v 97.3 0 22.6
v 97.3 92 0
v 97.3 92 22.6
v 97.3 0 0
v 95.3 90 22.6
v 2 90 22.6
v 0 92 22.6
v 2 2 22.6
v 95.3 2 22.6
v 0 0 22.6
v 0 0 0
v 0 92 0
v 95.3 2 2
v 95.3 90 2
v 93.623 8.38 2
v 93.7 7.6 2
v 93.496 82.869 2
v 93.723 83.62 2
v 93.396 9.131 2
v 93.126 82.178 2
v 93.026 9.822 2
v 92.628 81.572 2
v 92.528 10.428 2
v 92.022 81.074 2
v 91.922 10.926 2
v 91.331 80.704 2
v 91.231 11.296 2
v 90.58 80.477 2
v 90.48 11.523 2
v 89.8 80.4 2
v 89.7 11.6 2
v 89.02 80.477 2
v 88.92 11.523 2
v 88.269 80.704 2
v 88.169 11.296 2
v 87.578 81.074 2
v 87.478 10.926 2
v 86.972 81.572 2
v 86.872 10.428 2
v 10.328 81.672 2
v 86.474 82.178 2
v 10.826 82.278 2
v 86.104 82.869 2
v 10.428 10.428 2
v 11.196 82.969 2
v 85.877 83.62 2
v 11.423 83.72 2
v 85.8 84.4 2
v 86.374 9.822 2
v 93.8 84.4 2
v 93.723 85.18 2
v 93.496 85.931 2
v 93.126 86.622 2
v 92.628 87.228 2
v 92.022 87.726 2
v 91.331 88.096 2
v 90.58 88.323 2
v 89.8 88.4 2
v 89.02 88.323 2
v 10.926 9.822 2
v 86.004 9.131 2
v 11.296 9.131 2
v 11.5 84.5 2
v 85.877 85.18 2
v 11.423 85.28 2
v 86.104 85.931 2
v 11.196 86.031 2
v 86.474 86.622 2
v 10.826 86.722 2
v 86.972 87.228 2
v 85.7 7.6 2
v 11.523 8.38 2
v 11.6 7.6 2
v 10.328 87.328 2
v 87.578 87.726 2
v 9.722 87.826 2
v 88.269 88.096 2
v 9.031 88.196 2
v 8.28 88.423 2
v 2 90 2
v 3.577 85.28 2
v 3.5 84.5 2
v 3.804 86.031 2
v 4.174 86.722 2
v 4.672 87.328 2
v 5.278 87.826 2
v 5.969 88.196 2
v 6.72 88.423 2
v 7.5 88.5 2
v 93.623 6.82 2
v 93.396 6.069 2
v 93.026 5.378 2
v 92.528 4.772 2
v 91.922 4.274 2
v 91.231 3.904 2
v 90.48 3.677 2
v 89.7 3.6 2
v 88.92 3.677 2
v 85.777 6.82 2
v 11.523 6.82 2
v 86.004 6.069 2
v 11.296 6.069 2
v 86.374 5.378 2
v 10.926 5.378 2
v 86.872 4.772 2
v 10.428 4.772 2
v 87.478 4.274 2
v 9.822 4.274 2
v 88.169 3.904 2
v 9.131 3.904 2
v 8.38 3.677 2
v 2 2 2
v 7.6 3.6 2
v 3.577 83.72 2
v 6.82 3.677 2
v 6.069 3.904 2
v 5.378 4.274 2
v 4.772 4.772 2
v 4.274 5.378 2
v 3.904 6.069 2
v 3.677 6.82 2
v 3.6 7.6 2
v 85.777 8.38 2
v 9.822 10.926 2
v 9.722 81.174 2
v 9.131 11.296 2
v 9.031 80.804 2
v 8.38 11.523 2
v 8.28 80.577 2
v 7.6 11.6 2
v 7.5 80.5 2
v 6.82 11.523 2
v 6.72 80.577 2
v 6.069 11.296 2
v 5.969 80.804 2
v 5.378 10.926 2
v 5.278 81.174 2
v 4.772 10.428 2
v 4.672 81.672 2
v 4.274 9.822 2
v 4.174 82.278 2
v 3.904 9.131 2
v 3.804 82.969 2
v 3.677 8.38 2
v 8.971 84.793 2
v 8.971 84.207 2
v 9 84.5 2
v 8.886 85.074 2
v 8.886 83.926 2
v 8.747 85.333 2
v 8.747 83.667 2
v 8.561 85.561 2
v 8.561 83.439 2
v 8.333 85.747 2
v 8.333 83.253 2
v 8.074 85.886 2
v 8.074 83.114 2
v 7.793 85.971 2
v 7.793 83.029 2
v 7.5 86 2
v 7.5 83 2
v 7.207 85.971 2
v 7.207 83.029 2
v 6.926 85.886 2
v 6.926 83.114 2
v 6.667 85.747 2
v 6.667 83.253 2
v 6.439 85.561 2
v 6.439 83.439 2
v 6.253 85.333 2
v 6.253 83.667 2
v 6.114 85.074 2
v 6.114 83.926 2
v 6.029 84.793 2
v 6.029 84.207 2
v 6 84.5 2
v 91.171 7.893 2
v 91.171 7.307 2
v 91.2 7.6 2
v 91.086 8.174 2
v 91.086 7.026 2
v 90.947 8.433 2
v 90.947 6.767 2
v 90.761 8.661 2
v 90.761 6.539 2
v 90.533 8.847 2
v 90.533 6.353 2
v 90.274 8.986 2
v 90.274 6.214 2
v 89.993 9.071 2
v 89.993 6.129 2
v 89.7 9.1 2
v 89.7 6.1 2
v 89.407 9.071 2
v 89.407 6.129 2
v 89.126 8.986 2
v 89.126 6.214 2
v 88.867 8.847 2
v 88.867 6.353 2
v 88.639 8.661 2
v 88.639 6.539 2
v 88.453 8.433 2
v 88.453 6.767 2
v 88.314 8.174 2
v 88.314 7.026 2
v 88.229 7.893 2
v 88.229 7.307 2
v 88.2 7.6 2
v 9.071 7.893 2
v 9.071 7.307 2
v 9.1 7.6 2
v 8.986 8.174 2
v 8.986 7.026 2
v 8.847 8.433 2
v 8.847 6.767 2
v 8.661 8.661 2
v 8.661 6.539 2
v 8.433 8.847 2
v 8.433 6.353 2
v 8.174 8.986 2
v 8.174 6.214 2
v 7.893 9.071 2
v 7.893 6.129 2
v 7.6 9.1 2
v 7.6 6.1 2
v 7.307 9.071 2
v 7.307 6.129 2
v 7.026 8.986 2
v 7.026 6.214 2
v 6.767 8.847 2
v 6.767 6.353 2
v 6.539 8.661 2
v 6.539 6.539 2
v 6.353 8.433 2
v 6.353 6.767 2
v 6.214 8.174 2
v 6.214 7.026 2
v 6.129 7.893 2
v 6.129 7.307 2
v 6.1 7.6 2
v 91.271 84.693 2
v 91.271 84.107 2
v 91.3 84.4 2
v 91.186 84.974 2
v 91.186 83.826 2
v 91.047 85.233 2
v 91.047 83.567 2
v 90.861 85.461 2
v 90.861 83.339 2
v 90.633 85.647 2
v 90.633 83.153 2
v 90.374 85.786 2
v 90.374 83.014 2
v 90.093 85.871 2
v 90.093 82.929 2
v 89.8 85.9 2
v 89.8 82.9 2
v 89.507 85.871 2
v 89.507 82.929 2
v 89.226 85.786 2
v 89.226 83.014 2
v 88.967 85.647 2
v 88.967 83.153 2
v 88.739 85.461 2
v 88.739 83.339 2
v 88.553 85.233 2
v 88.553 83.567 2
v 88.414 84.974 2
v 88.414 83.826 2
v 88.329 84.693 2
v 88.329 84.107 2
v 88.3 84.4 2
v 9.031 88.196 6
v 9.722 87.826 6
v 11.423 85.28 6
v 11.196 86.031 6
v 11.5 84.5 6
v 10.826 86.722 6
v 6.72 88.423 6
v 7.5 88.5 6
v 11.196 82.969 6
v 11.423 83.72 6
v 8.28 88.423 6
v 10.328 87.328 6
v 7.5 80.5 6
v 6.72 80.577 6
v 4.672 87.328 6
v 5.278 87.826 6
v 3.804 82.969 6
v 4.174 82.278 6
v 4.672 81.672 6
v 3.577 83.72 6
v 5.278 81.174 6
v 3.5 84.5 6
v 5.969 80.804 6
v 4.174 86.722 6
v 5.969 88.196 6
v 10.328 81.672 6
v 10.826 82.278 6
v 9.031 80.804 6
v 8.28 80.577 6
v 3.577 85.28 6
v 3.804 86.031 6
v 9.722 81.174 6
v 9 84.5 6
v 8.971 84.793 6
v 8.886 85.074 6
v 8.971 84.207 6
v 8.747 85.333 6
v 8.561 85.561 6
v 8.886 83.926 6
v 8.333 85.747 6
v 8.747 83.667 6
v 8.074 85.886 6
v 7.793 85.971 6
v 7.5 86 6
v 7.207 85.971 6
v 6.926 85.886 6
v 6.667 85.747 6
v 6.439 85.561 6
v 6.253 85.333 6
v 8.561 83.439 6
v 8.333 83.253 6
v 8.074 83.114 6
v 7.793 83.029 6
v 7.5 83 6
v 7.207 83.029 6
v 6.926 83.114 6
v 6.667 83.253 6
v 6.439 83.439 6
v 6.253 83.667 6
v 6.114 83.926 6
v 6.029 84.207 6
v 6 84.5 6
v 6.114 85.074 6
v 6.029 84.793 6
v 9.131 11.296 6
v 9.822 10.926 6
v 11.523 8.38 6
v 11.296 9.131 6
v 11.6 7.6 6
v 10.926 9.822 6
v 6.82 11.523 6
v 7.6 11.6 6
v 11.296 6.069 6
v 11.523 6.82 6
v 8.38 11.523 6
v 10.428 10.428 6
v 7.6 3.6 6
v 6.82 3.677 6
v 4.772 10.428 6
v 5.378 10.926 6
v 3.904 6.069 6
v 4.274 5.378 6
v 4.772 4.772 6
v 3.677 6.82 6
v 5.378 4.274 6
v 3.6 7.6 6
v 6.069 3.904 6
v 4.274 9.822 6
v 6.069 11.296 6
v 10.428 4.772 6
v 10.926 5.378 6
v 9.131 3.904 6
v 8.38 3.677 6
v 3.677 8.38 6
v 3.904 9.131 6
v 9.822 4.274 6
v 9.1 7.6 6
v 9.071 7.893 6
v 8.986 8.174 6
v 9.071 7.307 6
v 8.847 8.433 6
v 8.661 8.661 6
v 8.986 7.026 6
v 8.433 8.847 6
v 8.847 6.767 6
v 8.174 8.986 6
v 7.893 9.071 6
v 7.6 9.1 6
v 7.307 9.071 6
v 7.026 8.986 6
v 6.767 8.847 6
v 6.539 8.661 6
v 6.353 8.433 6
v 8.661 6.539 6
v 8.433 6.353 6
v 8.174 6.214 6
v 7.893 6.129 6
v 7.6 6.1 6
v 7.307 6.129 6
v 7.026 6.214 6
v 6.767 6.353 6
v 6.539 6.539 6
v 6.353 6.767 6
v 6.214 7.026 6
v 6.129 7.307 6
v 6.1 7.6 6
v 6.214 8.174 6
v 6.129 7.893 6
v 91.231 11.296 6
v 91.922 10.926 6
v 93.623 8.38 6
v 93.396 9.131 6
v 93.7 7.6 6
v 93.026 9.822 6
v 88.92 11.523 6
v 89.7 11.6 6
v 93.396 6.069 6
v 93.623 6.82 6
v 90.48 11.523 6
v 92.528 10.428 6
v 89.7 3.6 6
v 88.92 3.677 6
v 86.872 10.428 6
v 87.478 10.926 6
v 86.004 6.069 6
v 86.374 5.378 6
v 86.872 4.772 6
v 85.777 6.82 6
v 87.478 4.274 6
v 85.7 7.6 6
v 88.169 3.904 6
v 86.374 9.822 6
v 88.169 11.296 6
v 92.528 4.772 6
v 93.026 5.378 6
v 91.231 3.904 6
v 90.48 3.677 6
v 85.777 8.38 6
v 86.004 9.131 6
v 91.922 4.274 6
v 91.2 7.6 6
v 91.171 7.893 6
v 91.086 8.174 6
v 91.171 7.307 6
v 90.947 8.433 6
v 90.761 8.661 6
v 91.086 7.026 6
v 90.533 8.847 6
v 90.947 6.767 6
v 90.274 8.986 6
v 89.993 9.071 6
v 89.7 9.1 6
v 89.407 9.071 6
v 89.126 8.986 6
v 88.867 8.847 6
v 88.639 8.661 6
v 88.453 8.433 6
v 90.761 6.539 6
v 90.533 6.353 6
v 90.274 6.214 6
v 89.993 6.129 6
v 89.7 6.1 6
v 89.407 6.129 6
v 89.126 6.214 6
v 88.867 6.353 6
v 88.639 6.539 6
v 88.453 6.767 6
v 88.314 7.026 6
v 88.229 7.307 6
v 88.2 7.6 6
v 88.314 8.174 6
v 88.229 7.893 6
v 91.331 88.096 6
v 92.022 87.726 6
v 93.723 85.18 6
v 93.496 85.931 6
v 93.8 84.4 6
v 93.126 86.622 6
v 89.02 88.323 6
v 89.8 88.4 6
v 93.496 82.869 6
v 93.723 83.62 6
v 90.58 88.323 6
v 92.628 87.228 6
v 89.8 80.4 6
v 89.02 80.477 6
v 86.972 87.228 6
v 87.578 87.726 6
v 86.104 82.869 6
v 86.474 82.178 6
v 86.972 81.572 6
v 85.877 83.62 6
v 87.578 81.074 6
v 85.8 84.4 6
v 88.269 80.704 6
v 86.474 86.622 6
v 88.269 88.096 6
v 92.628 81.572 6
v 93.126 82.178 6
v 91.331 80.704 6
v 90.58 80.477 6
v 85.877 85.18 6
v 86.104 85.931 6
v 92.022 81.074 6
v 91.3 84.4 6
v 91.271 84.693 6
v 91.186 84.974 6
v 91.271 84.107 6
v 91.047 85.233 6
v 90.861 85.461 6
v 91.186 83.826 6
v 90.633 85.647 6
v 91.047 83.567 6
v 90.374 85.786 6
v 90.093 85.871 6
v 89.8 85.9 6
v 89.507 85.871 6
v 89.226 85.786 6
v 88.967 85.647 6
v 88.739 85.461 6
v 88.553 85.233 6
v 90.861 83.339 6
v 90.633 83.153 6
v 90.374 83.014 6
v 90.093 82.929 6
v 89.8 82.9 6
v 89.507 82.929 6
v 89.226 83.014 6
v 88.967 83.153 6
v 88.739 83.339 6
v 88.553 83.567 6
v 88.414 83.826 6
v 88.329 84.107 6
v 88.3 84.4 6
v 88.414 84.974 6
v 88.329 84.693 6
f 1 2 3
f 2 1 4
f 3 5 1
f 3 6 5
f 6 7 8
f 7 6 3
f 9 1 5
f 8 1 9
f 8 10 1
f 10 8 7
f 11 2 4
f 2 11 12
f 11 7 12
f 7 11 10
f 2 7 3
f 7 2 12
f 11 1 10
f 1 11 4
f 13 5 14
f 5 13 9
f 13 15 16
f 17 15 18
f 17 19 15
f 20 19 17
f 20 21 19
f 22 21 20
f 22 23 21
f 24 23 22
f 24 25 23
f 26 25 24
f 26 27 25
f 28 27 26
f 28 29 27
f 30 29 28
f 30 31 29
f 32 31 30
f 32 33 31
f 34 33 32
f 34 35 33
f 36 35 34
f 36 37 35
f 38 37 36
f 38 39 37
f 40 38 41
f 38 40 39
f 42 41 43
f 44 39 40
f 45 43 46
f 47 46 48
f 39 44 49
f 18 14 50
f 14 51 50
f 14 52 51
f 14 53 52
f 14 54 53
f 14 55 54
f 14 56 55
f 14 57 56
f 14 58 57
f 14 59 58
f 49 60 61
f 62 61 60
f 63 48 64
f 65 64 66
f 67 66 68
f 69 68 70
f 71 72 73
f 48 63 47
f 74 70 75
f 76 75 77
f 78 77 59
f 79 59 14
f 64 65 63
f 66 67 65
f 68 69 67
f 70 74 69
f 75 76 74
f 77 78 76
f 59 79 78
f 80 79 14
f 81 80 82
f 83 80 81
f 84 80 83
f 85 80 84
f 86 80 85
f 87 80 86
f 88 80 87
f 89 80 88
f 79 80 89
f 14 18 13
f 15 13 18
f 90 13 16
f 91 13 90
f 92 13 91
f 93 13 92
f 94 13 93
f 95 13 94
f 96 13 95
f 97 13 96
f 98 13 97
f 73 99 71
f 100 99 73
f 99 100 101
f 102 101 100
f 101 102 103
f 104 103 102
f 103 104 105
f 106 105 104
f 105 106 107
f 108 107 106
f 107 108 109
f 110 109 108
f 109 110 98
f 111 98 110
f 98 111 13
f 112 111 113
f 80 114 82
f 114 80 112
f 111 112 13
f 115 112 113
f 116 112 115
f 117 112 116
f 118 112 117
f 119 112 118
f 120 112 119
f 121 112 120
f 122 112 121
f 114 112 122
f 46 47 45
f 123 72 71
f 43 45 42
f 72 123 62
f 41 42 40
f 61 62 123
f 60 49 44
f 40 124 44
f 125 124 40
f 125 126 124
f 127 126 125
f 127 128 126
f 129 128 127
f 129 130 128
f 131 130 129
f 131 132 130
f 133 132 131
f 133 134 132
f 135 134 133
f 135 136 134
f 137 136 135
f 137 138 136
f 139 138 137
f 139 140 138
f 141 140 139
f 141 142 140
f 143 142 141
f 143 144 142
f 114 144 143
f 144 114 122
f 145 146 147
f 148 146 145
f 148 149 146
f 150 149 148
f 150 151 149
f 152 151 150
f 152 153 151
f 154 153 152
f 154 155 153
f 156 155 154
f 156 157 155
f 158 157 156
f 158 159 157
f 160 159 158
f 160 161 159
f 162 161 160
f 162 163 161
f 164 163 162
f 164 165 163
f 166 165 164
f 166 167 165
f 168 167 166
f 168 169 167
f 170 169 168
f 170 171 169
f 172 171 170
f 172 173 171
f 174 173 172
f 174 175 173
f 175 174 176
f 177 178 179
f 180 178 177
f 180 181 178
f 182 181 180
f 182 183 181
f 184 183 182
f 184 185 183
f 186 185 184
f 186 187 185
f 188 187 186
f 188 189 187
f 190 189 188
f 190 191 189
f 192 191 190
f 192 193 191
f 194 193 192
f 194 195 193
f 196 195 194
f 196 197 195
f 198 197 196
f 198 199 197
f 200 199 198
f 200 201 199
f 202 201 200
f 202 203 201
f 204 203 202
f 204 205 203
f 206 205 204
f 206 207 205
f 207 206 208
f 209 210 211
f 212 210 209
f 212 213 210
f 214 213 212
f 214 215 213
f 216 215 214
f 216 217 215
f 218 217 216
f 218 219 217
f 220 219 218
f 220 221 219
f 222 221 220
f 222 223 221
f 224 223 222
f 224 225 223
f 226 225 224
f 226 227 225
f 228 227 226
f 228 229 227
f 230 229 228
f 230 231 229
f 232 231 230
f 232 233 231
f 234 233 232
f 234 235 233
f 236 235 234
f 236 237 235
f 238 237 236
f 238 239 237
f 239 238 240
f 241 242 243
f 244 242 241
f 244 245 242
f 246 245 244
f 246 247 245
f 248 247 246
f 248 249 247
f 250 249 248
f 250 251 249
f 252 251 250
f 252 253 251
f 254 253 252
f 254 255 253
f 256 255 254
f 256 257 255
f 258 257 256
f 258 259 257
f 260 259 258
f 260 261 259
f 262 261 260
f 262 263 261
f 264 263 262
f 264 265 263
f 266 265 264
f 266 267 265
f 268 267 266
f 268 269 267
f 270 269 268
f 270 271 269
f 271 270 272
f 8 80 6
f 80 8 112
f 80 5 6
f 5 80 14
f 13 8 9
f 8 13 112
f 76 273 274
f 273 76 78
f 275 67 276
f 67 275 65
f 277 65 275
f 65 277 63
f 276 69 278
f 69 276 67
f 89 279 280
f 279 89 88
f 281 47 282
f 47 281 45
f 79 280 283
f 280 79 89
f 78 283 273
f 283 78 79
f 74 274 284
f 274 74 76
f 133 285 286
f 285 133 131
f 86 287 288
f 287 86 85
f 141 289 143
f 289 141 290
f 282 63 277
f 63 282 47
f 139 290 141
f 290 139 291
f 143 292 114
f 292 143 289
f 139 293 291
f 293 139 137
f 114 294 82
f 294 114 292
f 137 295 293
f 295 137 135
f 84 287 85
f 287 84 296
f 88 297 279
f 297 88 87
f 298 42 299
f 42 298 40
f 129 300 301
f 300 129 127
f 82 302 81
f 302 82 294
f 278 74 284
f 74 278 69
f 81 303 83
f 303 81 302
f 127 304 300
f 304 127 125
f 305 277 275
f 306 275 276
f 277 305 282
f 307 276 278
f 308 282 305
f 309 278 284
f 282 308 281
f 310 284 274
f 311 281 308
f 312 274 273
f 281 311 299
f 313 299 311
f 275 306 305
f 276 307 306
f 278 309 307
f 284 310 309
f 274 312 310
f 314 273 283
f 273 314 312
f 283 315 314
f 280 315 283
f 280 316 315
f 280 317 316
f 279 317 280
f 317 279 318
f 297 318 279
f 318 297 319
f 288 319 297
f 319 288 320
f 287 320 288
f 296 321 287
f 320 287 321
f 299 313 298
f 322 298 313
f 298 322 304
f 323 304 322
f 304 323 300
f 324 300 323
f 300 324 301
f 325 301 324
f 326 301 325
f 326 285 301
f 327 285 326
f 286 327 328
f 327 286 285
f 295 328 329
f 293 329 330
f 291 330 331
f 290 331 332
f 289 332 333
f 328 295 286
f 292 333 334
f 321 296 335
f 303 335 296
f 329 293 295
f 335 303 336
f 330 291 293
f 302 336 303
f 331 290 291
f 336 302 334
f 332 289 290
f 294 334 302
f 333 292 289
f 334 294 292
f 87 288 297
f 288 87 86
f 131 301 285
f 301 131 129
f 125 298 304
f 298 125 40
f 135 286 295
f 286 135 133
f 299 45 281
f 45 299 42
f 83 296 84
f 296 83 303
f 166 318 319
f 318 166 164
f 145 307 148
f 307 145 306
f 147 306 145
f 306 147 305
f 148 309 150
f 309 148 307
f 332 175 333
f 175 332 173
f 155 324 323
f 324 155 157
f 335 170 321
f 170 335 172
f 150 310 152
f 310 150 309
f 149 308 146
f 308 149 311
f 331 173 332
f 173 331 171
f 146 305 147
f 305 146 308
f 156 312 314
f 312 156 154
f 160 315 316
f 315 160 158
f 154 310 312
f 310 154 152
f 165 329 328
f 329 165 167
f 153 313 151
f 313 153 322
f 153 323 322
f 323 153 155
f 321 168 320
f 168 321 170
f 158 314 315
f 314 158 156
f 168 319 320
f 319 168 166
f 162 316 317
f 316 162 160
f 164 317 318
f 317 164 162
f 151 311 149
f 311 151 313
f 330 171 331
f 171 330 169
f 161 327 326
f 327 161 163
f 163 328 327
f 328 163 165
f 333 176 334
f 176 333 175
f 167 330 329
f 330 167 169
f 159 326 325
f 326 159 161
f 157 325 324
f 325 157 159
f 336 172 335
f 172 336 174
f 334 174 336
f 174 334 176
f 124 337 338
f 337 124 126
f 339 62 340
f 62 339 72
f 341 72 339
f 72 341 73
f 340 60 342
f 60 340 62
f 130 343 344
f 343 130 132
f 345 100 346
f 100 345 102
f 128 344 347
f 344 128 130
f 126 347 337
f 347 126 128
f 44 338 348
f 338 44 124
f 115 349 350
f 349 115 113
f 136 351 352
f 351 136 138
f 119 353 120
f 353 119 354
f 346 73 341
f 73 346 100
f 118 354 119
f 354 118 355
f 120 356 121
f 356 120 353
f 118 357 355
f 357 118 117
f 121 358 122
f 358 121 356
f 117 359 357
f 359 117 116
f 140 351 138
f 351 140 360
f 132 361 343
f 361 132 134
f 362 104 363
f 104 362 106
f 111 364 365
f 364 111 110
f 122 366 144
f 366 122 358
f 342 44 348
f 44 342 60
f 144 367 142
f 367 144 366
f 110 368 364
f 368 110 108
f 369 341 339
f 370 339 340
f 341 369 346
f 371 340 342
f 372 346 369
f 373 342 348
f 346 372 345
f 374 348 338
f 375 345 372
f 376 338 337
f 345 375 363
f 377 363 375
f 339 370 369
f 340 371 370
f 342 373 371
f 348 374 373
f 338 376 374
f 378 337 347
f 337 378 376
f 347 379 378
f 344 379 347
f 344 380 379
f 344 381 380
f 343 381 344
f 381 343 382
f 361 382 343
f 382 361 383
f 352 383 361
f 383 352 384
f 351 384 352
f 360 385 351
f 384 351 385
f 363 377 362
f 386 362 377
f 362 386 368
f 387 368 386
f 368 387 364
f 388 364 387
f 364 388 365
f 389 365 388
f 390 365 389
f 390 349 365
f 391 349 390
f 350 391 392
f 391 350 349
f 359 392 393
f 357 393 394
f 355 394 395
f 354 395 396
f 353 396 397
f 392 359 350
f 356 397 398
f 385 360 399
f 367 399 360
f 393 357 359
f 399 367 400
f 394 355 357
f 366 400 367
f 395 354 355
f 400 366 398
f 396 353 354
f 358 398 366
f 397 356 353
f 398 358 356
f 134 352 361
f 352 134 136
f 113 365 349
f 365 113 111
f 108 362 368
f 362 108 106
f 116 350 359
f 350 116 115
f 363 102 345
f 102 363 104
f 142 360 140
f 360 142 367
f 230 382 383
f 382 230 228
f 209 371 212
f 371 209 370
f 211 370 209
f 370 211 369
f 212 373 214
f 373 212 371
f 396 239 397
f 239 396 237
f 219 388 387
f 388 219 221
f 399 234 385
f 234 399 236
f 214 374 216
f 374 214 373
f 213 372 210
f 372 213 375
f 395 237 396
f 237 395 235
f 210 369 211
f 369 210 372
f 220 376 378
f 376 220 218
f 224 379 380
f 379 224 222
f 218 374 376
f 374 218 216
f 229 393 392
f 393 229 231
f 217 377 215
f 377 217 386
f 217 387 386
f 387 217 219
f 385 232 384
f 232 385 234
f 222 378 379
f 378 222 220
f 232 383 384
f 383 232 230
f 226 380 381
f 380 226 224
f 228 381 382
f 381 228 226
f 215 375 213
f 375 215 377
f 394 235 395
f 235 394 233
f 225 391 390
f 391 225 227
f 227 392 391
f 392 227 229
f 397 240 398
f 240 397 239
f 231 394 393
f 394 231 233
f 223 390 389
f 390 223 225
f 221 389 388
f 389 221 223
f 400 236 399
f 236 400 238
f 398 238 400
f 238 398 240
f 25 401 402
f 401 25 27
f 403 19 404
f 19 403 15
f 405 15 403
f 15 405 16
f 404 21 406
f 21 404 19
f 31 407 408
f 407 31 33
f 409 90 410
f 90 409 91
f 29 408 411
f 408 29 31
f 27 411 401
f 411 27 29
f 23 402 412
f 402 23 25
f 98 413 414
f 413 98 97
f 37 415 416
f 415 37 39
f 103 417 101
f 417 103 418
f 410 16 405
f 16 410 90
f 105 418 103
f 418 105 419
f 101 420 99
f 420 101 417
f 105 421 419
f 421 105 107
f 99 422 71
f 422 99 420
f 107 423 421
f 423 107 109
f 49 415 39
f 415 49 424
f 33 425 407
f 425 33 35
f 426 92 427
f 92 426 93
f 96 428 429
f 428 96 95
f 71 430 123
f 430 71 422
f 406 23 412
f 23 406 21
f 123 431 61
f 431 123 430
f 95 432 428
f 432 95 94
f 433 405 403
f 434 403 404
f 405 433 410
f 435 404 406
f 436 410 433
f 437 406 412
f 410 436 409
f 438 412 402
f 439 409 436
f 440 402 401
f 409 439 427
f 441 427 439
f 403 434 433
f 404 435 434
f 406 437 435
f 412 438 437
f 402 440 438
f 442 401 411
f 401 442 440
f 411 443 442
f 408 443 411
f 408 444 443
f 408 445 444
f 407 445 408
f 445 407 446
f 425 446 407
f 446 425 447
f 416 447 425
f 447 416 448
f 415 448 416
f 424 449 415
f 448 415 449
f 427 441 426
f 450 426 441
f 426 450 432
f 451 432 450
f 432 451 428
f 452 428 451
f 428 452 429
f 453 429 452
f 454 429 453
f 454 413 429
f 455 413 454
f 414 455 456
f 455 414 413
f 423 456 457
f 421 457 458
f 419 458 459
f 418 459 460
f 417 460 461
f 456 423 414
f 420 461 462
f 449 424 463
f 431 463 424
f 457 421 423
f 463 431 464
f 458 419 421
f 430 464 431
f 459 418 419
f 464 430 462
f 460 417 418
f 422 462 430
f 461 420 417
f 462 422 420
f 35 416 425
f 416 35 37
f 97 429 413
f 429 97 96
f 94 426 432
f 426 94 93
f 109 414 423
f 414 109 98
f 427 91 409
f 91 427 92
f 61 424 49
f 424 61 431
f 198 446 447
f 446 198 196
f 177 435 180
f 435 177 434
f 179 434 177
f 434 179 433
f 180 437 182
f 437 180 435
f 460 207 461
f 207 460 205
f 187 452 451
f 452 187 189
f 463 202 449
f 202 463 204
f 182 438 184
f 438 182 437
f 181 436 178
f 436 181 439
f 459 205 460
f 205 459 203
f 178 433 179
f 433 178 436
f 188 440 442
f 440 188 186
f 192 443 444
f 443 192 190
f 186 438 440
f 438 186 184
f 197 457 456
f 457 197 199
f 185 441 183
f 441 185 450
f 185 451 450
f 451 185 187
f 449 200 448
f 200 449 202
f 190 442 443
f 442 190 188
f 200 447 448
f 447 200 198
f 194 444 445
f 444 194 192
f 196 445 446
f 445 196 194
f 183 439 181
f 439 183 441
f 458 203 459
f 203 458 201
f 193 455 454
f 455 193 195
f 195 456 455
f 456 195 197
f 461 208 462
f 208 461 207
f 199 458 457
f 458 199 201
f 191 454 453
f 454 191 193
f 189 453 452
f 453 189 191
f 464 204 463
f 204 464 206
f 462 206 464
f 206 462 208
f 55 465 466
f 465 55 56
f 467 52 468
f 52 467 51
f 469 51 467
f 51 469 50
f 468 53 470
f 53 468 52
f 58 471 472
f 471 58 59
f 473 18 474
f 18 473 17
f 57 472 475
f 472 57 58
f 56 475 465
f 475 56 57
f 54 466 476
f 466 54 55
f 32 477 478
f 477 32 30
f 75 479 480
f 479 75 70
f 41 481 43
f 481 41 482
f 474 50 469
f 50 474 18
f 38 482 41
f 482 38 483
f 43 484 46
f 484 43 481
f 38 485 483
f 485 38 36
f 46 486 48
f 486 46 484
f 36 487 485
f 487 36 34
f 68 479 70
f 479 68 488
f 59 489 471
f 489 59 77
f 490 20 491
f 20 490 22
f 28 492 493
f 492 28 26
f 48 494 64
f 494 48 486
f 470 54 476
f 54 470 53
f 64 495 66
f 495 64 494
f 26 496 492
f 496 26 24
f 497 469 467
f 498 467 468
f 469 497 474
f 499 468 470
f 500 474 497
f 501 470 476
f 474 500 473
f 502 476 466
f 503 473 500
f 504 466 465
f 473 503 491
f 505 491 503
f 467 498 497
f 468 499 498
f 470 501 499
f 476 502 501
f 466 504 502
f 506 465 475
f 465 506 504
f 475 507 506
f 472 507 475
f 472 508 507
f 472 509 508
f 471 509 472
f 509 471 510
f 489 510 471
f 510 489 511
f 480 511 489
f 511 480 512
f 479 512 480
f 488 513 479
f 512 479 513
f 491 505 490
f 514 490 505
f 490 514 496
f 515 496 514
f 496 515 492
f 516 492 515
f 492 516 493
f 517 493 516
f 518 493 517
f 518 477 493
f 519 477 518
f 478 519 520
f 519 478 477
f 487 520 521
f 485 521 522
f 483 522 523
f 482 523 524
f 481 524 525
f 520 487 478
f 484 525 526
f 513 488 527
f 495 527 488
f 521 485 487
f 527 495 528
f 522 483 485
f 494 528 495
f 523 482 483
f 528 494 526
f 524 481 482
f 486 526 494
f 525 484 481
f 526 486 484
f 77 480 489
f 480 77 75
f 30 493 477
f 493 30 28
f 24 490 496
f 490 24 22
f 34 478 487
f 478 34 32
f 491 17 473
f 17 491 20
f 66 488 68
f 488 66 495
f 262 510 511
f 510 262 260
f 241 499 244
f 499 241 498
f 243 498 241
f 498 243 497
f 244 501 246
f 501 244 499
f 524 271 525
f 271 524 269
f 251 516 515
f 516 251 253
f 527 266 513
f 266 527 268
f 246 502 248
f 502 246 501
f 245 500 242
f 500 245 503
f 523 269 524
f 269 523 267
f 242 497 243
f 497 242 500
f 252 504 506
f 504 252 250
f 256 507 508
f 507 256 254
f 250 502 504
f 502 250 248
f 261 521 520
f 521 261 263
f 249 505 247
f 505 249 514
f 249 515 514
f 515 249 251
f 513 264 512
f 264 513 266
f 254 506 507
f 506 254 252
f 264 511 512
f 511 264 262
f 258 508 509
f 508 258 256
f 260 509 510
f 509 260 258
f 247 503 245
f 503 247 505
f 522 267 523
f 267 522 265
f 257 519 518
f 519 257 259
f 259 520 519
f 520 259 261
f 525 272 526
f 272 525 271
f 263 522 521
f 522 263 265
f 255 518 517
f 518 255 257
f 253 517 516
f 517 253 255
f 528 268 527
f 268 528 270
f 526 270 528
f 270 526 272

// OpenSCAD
// ============================================================
// Gabinete - ModemEYSE4G_LTE_Cat1_simA7670SA
// Base generada a partir de las coordenadas reales del PCB
// (Modulo_SIMA7670SA.kicad_pcb)
// Sistema de coordenadas: origen en la esquina inferior
// izquierda de la placa (0,0), igual que se referencia en
// la conversacion de diseno.
// ============================================================

// ---------- PARAMETROS DE LA PLACA ----------
board_x = 90.3;         // ancho de la placa (mm)
board_y = 85.0;         // alto de la placa (mm)
board_thickness = 1.6;  // espesor del PCB (mm)

// ---------- PARAMETROS DEL GABINETE ----------
wall = 2.0;             // espesor de pared (mm) - ajustar segun impresora/proceso
clearance_xy = 1.5;     // holgura alrededor de la placa (mm)
floor_to_board = 6;     // altura libre debajo de la placa (para U3/U5/U6 que van sobre zocalo)
board_to_lid = 15;      // altura libre arriba de la placa (para conectores, LEDs, etc.)

// ---------- MOUNTING HOLES (posiciones reales, relativas a 0,0 de la placa) ----------
// H1: esquina inferior izquierda, H2: superior izquierda,
// H3: superior derecha, H4: inferior derecha
mount_holes = [
    [4.0, 81.0],   // H1
    [4.1, 4.1],    // H2
    [86.2, 4.1],   // H3
    [86.3, 80.9]   // H4
];
mount_hole_d = 4.0;     // diametro del taladro NPTH (confirmado en drill file)
standoff_od = 8.0;      // diametro externo del standoff/boss - AJUSTAR a gusto
screw_d = 3.0;          // diametro de tornillo autorroscante - CONFIRMAR con Damian

// ---------- CONECTORES (posiciones reales, relativas a 0,0 de la placa) ----------
// Cada uno con su rotacion tal cual figura en el PCB.
// Dimensiones de corte son PLACEHOLDER - ajustar con el
// datasheet real de cada conector antes de imprimir.

conn_J1_terminal = [23.7, 4.5, 180];   // borde superior - terminal +12V
conn_J5_barrel   = [14.9, 10.5, 180];  // borde superior - jack DC
conn_J2_db9      = [31.0, 76.8, 0];    // borde inferior - DB9
conn_J4_sma      = [70.7, 80.6, 90];   // borde inferior - SMA antena
// J3 (U.FL) es interno, no necesita corte en el gabinete.
// USB-C de U5: PENDIENTE - la rotacion actual del footprint
// no apunta a ningun borde (ver conversacion). Definir antes
// de agregar el corte correspondiente.

// ============================================================
// MODULOS
// ============================================================

module mounting_boss(h) {
    difference() {
        cylinder(h = h, d = standoff_od, $fn = 32);
        cylinder(h = h + 1, d = screw_d, $fn = 32);
    }
}

module base_gabinete() {
    outer_x = board_x + 2 * (wall + clearance_xy);
    outer_y = board_y + 2 * (wall + clearance_xy);
    total_h = floor_to_board + board_thickness + board_to_lid;

    difference() {
        // Cascaron exterior
        cube([outer_x, outer_y, total_h]);

        // Cavidad interior
        translate([wall, wall, wall])
            cube([outer_x - 2*wall, outer_y - 2*wall, total_h]);
    }

    // Bosses de montaje, posicionados segun coordenadas reales
    // (offset por el borde + holgura del gabinete)
    offset_x = wall + clearance_xy;
    offset_y = wall + clearance_xy;
    for (p = mount_holes) {
        translate([p[0] + offset_x, p[1] + offset_y, wall])
            mounting_boss(floor_to_board - wall);
    }
}

base_gabinete();

// ============================================================
// PENDIENTE / TODO:
// - Definir corte de USB-C de U5 una vez resuelta su rotacion
// - Ajustar dimensiones reales de cada conector (J1, J2, J4, J5)
//   con su datasheet antes de cortar las ventanas en las paredes
// - Confirmar diametro de tornillo (screw_d) y ajustar standoff_od
// - Agregar tapa (lid) por separado
// ============================================================
